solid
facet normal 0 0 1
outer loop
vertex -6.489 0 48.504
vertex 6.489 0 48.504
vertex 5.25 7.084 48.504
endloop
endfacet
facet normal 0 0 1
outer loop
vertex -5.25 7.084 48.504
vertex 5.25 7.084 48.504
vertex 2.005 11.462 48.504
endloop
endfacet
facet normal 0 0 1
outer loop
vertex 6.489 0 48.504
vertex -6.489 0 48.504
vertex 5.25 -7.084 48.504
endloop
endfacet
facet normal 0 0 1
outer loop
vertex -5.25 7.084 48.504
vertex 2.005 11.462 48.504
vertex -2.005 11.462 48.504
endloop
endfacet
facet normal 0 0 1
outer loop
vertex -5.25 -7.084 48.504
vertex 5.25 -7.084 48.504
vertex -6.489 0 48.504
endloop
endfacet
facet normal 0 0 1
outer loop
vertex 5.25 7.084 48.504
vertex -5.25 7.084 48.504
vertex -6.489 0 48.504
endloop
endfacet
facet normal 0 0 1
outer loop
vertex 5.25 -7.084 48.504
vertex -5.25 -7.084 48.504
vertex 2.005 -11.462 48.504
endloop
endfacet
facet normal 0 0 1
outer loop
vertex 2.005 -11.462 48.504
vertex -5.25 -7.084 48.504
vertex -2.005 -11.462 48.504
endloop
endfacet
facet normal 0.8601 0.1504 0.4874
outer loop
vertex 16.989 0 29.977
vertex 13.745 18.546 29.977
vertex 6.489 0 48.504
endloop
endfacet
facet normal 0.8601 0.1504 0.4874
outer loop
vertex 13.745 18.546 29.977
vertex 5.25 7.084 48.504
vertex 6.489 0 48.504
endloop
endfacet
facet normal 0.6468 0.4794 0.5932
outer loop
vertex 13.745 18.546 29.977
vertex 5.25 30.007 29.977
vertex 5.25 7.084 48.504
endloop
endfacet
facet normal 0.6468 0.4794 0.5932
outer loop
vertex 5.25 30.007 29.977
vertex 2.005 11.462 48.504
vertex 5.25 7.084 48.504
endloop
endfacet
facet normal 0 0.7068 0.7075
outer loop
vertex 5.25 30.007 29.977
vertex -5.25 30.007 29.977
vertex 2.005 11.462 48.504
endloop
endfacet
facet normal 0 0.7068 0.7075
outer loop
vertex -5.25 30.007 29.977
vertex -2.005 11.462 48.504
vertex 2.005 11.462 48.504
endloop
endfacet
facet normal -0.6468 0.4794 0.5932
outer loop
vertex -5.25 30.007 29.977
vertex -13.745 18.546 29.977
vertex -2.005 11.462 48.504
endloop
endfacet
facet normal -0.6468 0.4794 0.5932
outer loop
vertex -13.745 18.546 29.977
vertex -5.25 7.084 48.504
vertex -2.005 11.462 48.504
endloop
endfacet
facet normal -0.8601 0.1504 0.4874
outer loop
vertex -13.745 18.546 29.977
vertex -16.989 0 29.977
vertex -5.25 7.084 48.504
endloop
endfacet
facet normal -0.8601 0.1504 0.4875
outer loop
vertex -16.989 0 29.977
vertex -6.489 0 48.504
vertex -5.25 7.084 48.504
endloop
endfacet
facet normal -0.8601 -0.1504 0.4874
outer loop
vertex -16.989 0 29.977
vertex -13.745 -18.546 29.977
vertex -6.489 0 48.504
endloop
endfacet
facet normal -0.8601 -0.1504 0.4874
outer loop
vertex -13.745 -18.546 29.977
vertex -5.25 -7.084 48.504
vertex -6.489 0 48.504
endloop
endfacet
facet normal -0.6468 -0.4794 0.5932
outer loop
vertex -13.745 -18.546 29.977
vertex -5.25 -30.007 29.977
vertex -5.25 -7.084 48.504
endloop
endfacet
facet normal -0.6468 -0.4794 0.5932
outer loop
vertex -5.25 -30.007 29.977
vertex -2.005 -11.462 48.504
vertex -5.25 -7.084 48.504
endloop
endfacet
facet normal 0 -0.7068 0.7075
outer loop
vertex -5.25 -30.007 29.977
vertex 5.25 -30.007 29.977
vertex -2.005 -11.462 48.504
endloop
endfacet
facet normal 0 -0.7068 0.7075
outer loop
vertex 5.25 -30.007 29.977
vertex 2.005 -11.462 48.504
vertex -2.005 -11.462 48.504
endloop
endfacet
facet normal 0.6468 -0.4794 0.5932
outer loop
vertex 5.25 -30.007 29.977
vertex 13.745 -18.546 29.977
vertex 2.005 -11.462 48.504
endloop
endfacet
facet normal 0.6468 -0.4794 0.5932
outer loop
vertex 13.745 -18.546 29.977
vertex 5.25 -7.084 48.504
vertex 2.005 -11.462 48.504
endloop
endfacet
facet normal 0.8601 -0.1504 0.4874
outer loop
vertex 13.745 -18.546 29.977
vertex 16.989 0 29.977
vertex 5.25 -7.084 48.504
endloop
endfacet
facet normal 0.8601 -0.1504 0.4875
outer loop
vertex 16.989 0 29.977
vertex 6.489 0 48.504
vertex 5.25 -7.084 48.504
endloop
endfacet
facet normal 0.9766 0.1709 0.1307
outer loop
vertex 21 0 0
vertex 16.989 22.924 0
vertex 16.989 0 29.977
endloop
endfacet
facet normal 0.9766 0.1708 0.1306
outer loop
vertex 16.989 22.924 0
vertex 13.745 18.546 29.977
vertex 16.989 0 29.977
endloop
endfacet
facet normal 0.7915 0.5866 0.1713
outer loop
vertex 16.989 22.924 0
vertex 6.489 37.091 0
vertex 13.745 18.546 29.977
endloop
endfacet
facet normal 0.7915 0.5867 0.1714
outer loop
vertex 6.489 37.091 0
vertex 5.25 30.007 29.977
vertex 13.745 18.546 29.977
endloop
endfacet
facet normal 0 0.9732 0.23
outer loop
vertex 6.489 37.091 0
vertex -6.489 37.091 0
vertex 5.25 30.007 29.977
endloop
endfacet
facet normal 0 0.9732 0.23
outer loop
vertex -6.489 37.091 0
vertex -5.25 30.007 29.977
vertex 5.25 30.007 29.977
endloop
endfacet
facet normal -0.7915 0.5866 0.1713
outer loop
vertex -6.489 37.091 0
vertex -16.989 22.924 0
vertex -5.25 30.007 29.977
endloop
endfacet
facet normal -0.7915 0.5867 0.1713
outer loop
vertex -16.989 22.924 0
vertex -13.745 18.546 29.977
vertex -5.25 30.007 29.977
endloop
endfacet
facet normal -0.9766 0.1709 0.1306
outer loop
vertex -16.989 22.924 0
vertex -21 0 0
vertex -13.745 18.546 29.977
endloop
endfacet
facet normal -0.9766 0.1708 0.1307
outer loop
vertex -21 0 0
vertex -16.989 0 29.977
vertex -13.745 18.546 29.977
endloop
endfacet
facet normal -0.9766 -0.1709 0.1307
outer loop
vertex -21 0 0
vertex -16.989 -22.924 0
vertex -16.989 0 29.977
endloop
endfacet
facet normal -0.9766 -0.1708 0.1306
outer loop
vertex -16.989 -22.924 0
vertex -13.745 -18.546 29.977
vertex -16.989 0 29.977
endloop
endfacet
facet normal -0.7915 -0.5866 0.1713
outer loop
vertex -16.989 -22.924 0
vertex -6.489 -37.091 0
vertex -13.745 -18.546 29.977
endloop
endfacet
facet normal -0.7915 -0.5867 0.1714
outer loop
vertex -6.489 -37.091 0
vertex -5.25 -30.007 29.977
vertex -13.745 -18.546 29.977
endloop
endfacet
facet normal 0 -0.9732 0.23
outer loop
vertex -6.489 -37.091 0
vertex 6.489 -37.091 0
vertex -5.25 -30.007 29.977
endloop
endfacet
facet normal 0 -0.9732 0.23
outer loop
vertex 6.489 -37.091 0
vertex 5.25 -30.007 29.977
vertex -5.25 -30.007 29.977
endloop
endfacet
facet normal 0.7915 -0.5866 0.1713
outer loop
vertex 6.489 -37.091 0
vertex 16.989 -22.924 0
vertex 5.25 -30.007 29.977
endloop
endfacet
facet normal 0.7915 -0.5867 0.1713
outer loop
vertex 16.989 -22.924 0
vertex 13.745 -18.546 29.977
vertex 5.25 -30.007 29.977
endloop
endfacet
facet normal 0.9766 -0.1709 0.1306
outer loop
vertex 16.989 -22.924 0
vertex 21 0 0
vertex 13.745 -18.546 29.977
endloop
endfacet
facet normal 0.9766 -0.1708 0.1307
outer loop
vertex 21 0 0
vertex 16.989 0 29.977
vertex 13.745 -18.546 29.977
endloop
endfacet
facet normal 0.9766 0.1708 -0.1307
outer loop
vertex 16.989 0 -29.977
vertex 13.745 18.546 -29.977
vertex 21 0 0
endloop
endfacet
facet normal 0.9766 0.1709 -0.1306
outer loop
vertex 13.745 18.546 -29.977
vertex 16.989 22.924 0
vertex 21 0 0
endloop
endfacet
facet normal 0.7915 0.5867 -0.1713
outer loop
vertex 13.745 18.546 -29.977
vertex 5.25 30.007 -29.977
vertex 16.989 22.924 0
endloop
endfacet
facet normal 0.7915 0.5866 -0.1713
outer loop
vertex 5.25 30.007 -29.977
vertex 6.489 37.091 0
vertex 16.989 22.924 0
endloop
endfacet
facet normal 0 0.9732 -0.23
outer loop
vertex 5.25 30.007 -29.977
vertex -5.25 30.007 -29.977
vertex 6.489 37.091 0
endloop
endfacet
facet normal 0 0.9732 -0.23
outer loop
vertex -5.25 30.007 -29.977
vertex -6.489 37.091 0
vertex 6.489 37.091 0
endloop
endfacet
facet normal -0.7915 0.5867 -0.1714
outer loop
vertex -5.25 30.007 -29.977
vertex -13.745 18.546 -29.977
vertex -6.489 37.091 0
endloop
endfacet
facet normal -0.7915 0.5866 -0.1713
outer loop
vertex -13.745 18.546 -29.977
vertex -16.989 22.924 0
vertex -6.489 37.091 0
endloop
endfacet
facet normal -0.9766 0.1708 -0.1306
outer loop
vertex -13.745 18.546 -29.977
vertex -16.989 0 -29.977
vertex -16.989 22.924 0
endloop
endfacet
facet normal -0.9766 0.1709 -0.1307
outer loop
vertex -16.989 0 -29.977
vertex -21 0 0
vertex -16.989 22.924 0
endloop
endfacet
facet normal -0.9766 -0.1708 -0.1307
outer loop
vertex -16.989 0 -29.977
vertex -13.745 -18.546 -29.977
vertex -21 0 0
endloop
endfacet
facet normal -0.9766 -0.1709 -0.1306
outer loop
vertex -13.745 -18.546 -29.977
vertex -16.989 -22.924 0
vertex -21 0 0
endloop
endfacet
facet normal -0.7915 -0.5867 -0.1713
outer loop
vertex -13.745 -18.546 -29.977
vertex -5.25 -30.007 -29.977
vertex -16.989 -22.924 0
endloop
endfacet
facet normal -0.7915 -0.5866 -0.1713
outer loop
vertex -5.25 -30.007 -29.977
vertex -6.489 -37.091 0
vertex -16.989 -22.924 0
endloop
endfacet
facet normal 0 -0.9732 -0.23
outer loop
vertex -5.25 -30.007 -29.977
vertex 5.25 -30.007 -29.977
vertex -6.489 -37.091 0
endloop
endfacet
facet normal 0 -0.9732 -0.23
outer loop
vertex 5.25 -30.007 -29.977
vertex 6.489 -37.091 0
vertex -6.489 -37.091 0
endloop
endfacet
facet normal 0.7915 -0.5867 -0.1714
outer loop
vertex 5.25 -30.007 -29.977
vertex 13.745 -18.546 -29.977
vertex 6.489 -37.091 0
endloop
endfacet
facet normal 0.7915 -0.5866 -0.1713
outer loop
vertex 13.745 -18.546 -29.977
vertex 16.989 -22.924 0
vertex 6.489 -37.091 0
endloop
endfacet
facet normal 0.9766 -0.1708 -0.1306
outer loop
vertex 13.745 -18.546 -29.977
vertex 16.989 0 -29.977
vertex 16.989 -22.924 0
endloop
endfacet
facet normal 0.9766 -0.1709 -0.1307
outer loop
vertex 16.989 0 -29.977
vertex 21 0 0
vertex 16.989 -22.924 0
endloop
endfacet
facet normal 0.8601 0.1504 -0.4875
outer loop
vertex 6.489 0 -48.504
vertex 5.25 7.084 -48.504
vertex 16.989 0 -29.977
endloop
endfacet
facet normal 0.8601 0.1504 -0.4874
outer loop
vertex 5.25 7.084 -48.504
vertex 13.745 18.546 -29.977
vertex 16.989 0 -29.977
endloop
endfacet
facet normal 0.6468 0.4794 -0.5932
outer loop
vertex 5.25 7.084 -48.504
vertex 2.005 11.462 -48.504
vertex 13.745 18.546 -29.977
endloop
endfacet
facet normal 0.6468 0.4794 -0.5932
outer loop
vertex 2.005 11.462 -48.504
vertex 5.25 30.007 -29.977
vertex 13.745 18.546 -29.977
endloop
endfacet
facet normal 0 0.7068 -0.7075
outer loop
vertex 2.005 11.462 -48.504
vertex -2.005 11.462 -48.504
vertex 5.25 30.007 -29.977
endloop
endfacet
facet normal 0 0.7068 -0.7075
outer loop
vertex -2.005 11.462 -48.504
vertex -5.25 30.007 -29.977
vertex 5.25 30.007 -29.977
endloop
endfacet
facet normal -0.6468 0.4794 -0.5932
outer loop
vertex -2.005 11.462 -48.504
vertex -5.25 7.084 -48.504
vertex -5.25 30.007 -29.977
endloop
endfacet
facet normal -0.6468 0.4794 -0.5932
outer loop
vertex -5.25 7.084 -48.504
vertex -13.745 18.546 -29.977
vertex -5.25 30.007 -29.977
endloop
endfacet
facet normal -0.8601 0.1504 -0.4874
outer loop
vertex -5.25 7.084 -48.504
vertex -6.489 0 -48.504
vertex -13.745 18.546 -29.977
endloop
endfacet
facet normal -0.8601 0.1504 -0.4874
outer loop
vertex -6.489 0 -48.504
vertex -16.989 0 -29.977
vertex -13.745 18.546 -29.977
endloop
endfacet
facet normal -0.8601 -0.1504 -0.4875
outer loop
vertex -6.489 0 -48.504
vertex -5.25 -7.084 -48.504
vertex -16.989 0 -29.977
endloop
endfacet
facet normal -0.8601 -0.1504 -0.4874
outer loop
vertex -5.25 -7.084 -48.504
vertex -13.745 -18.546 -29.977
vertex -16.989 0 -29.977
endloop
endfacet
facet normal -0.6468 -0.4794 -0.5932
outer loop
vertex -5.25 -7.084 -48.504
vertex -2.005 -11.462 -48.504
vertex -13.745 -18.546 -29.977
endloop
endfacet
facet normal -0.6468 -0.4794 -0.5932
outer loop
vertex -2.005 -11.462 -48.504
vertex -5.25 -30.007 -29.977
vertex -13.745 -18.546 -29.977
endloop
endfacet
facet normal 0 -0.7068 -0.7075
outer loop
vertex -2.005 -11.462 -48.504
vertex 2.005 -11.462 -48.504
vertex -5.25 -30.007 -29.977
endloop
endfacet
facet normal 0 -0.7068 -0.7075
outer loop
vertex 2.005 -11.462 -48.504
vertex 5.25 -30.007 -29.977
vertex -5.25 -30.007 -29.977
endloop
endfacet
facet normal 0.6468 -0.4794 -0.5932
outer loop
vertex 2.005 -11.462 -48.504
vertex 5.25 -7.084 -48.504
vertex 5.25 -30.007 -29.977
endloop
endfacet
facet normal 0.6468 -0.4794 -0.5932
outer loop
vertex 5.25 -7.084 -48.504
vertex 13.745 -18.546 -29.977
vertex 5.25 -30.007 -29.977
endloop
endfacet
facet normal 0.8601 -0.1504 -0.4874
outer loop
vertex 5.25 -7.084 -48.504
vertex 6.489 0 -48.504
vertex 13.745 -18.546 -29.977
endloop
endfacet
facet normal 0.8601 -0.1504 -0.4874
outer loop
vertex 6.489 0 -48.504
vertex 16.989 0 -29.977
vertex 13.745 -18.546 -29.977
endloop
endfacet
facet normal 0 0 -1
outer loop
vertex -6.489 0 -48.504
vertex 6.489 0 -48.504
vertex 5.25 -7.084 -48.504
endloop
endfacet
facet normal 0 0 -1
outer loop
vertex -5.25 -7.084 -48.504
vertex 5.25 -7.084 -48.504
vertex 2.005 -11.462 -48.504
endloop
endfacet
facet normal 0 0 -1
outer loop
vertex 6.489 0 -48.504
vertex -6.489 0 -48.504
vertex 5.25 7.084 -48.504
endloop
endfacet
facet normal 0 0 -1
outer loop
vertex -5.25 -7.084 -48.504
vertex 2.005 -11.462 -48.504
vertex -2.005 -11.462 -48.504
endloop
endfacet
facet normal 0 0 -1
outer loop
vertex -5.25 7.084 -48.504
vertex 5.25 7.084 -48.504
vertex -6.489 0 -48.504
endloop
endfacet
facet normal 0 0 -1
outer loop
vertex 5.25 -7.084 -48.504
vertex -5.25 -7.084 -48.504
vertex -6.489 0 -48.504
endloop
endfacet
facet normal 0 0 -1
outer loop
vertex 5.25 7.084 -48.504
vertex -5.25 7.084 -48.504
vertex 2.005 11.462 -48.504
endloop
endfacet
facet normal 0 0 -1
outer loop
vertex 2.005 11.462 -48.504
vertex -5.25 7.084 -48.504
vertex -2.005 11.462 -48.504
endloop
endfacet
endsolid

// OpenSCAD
// Generated by SolidPython 1.0.1 on 2020-07-29 00:46:47


scale(v = [7, 13, 17]) {
	sphere(r = 3);
}
/***********************************************
*********      SolidPython code:      **********
************************************************
 
# import packages: SolidPython
from solid import *
from solid.utils import *
from itertools import chain, combinations, permutations


class Resize:

    def __init__(self, scad_file):
        self.scad_file = scad_file
        #self.scad_file = import_scad(scad_file)
        # cone/cylinder param:
        self.r1 = 0
        self.r2 = 0
        self.h = 0
        # rectangular prism param:
        self.w = 0
        self.l = 0
        # ellipse param:
        self.r = 0

    # import OpenScad code (file name corresponds to shape)


    # classify shape + parameters
    def assign(self, param1, param2, param3):
        if self.scad_file == 'cone.scad':
            self.r1 = param1
            self.r2 = param2
            self.h = param3
        elif self.scad_file == 'cylinder.scad':
            self.r1 = param1
            self.r2 = param2
            self.h = param3
        elif self.scad_file == 'rectangularPrism.scad':
            self.h = param1
            self.l = param2
            self.w = param3
        else:
            self.r = param1
            self.h = param2

    # resize parameters
    def iterate(self):
        x = range(3, 20, 2)
        i = 1
        if self.scad_file == 'cone.scad':
            tempList = list(permutations(x, 2))
            for temp in tempList:
                param1 = temp[0]
                param2 = temp[1]
                filepath = 'produced_scad_files/' + 'cone' + str(param1) + '_' + str(param2) + '_' + '.scad'
                scad_render_to_file(cylinder(h=param1, r1=param2, r2=0), filepath)

        elif self.scad_file == 'cylinder.scad':
            tempList = list(permutations(x, 3))
            for temp in tempList:
                param1 = temp[0]
                param2 = temp[1]
                filepath = 'produced_scad_files/' + 'cylinder' + str(param1) + '_' + str(param2) + '_' + '.scad'
                scad_render_to_file(cylinder(h=param1, r1=param2, r2=param2), filepath)

        elif self.scad_file == 'rectangularPrism.scad':
            tempList = list(permutations(x, 3))
            for temp in tempList:
                param1 = temp[0]
                param2 = temp[1]
                param3 = temp[2]
                filepath = 'produced_scad_files/' + 'rectangularPrism' + str(param1) + '_' + str(param2) + '_' + str(
                    param3) + '.scad'
                scad_render_to_file(cube(size=(param1, param2, param3)), filepath)

        elif self.scad_file == 'ellipse.scad':
            tempList = list(permutations(x, 4))
            for temp in tempList:
                param1 = temp[0]
                param2 = temp[1]
                param3 = temp[2]
                param4 = temp[3]
                filepath = 'produced_scad_files/' + 'ellipse' + str(param1) + '_' + str(param2) + '_' + str(param3) + '_' + str(param4) + '.scad'
                scad_render_to_file(scale([param1, param2, param3])(sphere(r=param4)), filepath)

    def render_to_scadfile(self):
        scad_render_to_file(scad, 'example.scad') 
 
************************************************/
